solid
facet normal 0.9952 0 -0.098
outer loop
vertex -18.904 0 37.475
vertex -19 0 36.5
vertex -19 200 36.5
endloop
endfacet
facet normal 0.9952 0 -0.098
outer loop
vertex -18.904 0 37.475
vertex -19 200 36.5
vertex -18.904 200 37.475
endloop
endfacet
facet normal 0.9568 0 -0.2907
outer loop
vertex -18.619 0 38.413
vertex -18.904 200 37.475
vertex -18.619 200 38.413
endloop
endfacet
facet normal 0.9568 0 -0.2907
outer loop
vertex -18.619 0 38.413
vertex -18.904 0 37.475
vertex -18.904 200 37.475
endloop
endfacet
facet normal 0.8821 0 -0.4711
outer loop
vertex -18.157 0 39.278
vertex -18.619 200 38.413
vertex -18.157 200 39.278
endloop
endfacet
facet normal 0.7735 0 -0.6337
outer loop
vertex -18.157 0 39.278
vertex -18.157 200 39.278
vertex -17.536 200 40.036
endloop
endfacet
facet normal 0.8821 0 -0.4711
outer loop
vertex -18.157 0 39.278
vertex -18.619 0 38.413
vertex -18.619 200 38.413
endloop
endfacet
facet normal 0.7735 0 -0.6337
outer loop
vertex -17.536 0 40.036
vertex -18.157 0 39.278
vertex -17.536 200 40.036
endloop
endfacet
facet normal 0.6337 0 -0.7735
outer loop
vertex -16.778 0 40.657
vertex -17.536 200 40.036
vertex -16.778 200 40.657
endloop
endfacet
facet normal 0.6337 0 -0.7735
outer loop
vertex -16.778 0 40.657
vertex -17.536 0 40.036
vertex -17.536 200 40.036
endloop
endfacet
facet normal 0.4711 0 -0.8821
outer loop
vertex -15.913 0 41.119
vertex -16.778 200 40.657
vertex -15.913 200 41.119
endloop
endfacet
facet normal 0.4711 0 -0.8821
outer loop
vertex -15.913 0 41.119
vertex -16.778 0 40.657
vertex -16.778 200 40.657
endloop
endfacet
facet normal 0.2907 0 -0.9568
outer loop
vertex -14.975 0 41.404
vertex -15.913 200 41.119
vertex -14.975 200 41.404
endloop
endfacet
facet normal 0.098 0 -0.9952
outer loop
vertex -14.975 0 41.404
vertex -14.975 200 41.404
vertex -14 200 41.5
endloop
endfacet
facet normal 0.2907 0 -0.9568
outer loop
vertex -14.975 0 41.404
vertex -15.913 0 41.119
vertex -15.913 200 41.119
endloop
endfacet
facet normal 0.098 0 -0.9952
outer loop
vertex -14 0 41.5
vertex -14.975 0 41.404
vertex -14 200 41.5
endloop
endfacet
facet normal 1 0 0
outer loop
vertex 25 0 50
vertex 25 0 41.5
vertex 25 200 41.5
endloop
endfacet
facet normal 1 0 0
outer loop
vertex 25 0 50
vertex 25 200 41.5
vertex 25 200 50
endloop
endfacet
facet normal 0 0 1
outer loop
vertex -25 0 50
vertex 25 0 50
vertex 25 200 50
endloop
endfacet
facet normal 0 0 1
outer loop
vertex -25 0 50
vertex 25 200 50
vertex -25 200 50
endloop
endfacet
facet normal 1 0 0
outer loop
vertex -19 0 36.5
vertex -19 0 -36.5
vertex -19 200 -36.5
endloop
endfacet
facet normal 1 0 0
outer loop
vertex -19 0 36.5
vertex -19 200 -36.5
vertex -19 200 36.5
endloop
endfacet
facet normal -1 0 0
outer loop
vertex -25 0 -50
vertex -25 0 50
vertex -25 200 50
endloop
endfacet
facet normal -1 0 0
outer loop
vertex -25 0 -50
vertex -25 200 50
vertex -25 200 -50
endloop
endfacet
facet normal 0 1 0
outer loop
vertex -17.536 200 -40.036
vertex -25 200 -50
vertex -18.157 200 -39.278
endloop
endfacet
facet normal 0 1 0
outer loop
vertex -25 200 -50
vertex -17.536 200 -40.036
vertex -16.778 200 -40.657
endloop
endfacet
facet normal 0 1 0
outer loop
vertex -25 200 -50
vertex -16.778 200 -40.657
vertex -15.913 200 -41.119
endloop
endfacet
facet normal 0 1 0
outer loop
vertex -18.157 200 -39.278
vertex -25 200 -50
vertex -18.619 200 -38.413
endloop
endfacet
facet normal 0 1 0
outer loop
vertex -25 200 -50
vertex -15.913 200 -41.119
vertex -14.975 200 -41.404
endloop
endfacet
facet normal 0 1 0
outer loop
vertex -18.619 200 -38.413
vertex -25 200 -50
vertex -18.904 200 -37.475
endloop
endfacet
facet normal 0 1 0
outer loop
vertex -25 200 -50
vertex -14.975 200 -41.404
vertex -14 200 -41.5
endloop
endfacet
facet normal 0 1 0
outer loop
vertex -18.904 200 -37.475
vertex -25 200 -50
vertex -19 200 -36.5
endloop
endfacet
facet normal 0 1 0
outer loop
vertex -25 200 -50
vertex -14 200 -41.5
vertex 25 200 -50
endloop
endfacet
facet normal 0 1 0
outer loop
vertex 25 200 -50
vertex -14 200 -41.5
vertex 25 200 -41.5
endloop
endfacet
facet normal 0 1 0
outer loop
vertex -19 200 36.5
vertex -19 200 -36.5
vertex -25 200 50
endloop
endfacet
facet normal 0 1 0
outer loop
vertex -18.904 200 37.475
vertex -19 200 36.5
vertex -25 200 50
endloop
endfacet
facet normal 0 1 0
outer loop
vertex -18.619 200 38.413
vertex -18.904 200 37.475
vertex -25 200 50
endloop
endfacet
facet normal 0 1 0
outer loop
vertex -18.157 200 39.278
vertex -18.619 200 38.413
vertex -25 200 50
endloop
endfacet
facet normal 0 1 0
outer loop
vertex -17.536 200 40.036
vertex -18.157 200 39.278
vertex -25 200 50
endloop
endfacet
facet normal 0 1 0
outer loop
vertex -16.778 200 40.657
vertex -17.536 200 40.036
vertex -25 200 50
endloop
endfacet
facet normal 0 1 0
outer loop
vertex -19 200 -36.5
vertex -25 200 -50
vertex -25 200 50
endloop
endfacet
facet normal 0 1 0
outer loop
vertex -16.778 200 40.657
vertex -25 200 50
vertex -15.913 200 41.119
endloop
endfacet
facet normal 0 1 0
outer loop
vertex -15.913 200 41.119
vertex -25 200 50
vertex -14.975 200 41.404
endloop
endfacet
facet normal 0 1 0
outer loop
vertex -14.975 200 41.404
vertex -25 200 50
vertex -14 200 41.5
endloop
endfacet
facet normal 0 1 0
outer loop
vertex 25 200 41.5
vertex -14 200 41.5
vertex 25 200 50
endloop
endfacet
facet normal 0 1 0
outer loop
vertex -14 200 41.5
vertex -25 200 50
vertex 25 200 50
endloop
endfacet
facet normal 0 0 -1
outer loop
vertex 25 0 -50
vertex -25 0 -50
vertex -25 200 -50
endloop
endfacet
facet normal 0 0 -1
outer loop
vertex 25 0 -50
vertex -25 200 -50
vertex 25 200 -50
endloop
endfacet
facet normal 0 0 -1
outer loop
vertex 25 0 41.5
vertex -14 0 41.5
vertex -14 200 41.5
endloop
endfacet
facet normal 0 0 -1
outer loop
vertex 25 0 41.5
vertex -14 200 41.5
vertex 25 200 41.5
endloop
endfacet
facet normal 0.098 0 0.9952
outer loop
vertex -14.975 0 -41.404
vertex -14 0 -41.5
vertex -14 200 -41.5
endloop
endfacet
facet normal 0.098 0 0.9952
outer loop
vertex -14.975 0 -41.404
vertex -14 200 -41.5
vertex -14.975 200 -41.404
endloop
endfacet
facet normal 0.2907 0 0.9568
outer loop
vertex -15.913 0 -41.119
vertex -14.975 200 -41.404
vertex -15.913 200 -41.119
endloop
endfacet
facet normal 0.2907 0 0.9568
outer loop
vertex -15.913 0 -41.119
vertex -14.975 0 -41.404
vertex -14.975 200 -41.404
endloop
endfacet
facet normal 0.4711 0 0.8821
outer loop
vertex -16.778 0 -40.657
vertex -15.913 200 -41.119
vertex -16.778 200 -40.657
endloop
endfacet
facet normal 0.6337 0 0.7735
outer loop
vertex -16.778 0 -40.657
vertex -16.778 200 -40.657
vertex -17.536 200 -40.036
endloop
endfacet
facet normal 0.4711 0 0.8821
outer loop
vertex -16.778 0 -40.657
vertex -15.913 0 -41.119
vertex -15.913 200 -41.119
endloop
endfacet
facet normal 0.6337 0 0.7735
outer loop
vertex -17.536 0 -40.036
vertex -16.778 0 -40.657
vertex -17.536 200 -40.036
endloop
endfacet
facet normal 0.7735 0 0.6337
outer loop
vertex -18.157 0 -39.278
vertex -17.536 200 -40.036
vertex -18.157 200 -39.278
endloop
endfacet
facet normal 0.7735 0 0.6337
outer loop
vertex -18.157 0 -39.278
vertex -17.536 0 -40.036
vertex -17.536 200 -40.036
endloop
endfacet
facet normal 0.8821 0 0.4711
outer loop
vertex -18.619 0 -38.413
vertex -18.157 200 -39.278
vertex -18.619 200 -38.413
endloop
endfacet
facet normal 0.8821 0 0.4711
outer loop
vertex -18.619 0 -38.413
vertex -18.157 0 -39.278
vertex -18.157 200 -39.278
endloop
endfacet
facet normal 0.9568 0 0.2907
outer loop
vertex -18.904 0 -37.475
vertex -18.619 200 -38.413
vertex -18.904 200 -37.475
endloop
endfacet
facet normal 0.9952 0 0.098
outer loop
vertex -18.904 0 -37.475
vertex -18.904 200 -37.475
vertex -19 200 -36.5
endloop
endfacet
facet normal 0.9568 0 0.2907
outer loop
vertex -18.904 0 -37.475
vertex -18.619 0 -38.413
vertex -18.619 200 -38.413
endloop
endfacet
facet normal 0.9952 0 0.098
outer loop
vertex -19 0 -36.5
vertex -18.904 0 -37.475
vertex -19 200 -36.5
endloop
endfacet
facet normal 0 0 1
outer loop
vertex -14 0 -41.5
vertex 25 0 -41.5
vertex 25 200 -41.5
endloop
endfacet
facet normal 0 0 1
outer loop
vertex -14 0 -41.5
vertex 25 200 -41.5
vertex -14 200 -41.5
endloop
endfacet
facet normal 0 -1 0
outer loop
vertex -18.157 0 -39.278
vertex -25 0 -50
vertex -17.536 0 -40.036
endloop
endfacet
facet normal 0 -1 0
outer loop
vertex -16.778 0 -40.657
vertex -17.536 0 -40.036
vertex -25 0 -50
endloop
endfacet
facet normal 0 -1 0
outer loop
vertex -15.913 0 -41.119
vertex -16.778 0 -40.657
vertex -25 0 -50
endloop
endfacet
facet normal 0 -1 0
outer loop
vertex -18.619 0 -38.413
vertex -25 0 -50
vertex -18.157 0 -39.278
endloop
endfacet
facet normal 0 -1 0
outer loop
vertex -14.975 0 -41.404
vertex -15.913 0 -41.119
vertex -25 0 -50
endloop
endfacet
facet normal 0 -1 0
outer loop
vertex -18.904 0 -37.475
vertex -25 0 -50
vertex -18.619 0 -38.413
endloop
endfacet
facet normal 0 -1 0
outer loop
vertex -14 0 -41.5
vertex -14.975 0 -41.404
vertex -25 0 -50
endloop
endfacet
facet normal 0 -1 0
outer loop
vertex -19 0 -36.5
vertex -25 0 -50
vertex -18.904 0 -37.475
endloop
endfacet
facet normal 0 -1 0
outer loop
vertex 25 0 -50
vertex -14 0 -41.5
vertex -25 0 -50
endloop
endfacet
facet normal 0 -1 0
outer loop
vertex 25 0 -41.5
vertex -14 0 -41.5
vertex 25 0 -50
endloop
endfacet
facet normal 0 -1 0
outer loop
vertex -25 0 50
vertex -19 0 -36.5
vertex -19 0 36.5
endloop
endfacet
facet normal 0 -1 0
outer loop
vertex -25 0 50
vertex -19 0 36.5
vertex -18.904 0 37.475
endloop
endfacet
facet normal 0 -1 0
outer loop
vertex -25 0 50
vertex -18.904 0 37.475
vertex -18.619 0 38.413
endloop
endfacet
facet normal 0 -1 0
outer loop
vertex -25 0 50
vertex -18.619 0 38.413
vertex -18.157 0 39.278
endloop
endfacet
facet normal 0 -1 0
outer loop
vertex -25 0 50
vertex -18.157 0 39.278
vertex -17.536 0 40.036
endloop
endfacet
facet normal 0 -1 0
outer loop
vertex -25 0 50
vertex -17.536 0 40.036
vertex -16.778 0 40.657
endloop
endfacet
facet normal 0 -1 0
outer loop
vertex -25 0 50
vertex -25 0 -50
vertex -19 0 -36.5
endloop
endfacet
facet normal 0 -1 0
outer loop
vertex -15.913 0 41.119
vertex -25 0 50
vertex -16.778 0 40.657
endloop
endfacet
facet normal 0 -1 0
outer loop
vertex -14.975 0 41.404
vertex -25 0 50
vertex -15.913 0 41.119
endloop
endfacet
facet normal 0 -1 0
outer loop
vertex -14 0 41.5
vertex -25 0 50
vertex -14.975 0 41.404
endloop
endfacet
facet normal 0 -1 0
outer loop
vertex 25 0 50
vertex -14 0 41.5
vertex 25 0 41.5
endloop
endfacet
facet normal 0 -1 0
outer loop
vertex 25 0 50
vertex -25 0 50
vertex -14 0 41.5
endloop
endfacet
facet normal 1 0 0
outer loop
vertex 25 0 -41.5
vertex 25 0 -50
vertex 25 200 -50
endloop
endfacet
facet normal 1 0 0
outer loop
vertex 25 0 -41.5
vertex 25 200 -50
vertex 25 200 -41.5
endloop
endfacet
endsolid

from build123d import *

# Parameters (mm, degrees)
F1_DEPTH = 200


with BuildPart() as f1:
    # F0 (on Front) → F1 (new body)
    with BuildSketch(Plane.XZ):
        with BuildLine():
            Line((25, 41.5), (25, 50))
            Line((25, 50), (-25, 50))
            Line((-25, 50), (-25, -50))
            Line((-25, -50), (25, -50))
            Line((25, -50), (25, -41.5))
            Line((25, -41.5), (-14, -41.5))
            ThreePointArc((-14, -41.5), (-17.535534, -40.035534), (-19, -36.5))
            Line((-19, -36.5), (-19, 36.5))
            ThreePointArc((-19, 36.5), (-17.535534, 40.035534), (-14, 41.5))
            Line((-14, 41.5), (25, 41.5))
        make_face()
    extrude(amount=-F1_DEPTH)


solid = f1.part
